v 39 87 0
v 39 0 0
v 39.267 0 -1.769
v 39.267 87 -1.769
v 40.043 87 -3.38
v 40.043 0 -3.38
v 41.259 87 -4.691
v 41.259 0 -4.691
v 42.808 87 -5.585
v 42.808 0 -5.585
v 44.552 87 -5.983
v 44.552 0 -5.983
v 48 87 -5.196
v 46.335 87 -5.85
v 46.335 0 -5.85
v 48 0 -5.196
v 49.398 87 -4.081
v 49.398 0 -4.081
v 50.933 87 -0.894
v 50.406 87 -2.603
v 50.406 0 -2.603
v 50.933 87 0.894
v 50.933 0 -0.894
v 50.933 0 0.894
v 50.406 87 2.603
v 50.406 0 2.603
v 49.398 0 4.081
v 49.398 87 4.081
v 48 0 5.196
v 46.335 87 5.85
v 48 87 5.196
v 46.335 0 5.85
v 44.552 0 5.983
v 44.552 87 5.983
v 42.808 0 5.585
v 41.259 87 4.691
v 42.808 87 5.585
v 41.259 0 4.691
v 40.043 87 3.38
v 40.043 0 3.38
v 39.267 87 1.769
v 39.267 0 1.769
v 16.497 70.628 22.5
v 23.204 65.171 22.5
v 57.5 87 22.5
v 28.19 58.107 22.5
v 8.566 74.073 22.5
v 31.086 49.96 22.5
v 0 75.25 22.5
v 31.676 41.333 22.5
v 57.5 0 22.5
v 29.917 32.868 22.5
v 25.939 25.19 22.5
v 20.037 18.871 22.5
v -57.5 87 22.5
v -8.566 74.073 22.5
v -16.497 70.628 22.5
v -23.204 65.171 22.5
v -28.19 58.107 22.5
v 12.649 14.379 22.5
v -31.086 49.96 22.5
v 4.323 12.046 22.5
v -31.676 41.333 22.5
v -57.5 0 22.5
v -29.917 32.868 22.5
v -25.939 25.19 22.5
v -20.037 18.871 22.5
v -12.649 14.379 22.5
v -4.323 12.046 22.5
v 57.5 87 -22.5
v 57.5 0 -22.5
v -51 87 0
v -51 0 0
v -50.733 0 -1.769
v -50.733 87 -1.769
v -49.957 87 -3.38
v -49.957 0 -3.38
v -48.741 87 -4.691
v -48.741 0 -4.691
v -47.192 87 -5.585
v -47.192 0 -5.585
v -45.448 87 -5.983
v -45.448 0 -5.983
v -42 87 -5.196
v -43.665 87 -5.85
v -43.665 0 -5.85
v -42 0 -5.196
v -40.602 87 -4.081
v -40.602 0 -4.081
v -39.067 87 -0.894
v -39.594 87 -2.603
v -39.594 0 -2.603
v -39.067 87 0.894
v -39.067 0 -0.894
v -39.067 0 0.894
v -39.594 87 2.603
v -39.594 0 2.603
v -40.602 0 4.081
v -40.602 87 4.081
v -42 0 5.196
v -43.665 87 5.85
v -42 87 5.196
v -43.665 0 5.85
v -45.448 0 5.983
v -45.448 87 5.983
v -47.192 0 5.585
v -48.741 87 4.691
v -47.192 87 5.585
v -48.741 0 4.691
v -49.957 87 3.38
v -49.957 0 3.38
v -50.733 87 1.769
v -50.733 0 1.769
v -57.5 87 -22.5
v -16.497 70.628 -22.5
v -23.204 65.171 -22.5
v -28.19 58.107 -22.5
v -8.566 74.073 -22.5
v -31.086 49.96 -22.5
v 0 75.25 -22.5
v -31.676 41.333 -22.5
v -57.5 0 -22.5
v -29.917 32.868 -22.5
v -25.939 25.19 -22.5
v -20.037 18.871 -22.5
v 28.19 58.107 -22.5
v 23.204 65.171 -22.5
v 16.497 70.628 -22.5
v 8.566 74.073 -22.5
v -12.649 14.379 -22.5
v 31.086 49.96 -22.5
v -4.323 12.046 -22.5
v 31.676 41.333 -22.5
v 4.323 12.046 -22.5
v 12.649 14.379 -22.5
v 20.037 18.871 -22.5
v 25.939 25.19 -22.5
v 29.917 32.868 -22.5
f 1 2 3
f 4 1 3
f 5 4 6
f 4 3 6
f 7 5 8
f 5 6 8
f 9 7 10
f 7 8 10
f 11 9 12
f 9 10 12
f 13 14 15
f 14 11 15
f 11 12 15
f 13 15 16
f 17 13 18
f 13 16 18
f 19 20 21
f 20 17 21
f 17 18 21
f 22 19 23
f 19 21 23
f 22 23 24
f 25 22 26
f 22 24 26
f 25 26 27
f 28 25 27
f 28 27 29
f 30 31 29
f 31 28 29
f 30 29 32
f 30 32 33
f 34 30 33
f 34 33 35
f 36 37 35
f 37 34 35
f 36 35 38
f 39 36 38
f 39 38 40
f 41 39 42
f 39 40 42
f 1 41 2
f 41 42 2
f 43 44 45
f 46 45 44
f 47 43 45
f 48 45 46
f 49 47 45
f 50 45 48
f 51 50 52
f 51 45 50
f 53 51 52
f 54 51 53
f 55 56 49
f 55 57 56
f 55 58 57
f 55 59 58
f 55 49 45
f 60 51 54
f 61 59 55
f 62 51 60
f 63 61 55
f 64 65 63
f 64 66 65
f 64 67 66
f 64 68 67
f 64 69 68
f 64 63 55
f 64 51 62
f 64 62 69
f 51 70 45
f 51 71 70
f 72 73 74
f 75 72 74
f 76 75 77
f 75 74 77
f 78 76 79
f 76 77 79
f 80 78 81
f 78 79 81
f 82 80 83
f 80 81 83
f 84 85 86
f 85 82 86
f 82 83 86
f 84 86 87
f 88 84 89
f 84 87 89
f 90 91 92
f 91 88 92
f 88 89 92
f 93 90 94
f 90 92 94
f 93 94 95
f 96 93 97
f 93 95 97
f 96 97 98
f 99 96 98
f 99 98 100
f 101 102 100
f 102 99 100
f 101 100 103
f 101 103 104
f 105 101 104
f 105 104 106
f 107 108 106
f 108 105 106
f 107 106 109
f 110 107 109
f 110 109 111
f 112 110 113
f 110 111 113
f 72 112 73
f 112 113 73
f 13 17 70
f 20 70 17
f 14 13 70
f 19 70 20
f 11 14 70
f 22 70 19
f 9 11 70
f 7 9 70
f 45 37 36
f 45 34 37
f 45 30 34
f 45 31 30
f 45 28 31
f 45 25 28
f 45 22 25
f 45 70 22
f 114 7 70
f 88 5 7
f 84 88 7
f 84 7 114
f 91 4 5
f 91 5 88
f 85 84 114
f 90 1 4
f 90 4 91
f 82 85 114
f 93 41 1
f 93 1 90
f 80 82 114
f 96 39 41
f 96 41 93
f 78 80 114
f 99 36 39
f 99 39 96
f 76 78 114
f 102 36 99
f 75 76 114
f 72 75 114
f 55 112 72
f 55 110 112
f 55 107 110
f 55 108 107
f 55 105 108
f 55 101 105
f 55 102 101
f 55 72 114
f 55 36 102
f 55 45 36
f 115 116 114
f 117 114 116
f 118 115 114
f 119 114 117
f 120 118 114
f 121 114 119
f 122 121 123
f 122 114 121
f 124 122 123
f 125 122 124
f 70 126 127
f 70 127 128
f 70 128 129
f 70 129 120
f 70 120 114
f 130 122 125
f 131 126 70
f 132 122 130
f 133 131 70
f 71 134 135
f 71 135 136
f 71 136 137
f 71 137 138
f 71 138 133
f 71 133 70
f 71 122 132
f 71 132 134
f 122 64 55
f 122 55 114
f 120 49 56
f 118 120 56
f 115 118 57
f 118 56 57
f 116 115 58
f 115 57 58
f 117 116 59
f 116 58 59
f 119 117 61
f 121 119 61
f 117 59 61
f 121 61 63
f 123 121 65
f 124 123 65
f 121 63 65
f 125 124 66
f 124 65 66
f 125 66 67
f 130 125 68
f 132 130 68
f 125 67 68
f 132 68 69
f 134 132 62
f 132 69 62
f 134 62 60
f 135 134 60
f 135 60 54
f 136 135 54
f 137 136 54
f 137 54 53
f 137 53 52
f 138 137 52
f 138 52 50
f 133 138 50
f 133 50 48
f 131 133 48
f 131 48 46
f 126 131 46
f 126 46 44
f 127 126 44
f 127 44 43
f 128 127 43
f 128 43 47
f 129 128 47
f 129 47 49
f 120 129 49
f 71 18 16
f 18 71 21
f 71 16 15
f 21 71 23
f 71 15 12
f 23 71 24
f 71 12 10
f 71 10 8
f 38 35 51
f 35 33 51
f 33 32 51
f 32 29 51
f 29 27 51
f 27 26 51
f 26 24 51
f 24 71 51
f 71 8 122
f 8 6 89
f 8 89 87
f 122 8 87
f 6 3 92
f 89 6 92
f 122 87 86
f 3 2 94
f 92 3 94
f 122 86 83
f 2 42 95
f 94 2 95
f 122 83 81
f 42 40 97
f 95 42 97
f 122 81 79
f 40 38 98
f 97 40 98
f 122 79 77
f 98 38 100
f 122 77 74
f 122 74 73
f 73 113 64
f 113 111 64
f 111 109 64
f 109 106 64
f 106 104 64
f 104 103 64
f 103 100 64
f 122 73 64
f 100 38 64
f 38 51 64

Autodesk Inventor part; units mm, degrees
ref_plane "YZ Plane" through (0, 0, 0) normal (1, 0, 0) x (0, 1, 0)
ref_plane "XZ Plane" through (0, 0, 0) normal (0, 1, 0) x (-1, 0, 0)
ref_plane "XY Plane" through (0, 0, 0) normal (0, 0, 1) x (1, 0, 0)
sketch "Sketch20" plane through (0, 0, 0) normal (0, 1, 0) x (-1, 0, 0)
  line L0 (57.5, -22.5) -> (-57.5, -22.5)
  line L1 (-57.5, -22.5) -> (-57.5, 22.5)
  line L2 (-57.5, 22.5) -> (57.5, 22.5)
  line L3 (57.5, 22.5) -> (57.5, -22.5)
  circle A0 centre (45, 0) radius 6
  circle A1 centre (-45, 0) radius 6
  point P0 (0, 0)
  dimension "d92" = 115
  dimension "d93" = 45
  dimension "d94" = 57.5
  dimension "d95" = 22.5
  dimension "d97" = 45
  dimension "d98" = 90
  dimension "d99" = 12
  dimension "d100" = 12
extrude "Extrusion17" add sketch "Sketch20" along normal blind 87
sketch "Sketch21" plane through (57.5, 0, -22.5) normal (0, 0, -1) x (-1, 0, 0)
  line L0 (115, 0) -> (115, 87) projected
  line L1 (0, 87) -> (115, 87) projected
  line L2 (0, 0) -> (0, 87) projected
  line L3 (57.5, 0) -> (57.5, 87) construction
  line L4 (115, 43.5) -> (0, 43.5) construction
  circle A0 centre (57.5, 43.5) radius 31.75
  dimension "d103" = 63.5
hole "Hole1" at (0, 43.5, -22.5) direction (0, 0, 1) diameter 63.5 end through all
equation "\"d94\" = 0.5 * d92"
equation "\"d95\" = 0.5 * d93"
equation "\"d97\" = 0.5 * d98"
equation "\"d100\" = d99"
properties part number "2.5 CIM mount" material "Polypropylene"
